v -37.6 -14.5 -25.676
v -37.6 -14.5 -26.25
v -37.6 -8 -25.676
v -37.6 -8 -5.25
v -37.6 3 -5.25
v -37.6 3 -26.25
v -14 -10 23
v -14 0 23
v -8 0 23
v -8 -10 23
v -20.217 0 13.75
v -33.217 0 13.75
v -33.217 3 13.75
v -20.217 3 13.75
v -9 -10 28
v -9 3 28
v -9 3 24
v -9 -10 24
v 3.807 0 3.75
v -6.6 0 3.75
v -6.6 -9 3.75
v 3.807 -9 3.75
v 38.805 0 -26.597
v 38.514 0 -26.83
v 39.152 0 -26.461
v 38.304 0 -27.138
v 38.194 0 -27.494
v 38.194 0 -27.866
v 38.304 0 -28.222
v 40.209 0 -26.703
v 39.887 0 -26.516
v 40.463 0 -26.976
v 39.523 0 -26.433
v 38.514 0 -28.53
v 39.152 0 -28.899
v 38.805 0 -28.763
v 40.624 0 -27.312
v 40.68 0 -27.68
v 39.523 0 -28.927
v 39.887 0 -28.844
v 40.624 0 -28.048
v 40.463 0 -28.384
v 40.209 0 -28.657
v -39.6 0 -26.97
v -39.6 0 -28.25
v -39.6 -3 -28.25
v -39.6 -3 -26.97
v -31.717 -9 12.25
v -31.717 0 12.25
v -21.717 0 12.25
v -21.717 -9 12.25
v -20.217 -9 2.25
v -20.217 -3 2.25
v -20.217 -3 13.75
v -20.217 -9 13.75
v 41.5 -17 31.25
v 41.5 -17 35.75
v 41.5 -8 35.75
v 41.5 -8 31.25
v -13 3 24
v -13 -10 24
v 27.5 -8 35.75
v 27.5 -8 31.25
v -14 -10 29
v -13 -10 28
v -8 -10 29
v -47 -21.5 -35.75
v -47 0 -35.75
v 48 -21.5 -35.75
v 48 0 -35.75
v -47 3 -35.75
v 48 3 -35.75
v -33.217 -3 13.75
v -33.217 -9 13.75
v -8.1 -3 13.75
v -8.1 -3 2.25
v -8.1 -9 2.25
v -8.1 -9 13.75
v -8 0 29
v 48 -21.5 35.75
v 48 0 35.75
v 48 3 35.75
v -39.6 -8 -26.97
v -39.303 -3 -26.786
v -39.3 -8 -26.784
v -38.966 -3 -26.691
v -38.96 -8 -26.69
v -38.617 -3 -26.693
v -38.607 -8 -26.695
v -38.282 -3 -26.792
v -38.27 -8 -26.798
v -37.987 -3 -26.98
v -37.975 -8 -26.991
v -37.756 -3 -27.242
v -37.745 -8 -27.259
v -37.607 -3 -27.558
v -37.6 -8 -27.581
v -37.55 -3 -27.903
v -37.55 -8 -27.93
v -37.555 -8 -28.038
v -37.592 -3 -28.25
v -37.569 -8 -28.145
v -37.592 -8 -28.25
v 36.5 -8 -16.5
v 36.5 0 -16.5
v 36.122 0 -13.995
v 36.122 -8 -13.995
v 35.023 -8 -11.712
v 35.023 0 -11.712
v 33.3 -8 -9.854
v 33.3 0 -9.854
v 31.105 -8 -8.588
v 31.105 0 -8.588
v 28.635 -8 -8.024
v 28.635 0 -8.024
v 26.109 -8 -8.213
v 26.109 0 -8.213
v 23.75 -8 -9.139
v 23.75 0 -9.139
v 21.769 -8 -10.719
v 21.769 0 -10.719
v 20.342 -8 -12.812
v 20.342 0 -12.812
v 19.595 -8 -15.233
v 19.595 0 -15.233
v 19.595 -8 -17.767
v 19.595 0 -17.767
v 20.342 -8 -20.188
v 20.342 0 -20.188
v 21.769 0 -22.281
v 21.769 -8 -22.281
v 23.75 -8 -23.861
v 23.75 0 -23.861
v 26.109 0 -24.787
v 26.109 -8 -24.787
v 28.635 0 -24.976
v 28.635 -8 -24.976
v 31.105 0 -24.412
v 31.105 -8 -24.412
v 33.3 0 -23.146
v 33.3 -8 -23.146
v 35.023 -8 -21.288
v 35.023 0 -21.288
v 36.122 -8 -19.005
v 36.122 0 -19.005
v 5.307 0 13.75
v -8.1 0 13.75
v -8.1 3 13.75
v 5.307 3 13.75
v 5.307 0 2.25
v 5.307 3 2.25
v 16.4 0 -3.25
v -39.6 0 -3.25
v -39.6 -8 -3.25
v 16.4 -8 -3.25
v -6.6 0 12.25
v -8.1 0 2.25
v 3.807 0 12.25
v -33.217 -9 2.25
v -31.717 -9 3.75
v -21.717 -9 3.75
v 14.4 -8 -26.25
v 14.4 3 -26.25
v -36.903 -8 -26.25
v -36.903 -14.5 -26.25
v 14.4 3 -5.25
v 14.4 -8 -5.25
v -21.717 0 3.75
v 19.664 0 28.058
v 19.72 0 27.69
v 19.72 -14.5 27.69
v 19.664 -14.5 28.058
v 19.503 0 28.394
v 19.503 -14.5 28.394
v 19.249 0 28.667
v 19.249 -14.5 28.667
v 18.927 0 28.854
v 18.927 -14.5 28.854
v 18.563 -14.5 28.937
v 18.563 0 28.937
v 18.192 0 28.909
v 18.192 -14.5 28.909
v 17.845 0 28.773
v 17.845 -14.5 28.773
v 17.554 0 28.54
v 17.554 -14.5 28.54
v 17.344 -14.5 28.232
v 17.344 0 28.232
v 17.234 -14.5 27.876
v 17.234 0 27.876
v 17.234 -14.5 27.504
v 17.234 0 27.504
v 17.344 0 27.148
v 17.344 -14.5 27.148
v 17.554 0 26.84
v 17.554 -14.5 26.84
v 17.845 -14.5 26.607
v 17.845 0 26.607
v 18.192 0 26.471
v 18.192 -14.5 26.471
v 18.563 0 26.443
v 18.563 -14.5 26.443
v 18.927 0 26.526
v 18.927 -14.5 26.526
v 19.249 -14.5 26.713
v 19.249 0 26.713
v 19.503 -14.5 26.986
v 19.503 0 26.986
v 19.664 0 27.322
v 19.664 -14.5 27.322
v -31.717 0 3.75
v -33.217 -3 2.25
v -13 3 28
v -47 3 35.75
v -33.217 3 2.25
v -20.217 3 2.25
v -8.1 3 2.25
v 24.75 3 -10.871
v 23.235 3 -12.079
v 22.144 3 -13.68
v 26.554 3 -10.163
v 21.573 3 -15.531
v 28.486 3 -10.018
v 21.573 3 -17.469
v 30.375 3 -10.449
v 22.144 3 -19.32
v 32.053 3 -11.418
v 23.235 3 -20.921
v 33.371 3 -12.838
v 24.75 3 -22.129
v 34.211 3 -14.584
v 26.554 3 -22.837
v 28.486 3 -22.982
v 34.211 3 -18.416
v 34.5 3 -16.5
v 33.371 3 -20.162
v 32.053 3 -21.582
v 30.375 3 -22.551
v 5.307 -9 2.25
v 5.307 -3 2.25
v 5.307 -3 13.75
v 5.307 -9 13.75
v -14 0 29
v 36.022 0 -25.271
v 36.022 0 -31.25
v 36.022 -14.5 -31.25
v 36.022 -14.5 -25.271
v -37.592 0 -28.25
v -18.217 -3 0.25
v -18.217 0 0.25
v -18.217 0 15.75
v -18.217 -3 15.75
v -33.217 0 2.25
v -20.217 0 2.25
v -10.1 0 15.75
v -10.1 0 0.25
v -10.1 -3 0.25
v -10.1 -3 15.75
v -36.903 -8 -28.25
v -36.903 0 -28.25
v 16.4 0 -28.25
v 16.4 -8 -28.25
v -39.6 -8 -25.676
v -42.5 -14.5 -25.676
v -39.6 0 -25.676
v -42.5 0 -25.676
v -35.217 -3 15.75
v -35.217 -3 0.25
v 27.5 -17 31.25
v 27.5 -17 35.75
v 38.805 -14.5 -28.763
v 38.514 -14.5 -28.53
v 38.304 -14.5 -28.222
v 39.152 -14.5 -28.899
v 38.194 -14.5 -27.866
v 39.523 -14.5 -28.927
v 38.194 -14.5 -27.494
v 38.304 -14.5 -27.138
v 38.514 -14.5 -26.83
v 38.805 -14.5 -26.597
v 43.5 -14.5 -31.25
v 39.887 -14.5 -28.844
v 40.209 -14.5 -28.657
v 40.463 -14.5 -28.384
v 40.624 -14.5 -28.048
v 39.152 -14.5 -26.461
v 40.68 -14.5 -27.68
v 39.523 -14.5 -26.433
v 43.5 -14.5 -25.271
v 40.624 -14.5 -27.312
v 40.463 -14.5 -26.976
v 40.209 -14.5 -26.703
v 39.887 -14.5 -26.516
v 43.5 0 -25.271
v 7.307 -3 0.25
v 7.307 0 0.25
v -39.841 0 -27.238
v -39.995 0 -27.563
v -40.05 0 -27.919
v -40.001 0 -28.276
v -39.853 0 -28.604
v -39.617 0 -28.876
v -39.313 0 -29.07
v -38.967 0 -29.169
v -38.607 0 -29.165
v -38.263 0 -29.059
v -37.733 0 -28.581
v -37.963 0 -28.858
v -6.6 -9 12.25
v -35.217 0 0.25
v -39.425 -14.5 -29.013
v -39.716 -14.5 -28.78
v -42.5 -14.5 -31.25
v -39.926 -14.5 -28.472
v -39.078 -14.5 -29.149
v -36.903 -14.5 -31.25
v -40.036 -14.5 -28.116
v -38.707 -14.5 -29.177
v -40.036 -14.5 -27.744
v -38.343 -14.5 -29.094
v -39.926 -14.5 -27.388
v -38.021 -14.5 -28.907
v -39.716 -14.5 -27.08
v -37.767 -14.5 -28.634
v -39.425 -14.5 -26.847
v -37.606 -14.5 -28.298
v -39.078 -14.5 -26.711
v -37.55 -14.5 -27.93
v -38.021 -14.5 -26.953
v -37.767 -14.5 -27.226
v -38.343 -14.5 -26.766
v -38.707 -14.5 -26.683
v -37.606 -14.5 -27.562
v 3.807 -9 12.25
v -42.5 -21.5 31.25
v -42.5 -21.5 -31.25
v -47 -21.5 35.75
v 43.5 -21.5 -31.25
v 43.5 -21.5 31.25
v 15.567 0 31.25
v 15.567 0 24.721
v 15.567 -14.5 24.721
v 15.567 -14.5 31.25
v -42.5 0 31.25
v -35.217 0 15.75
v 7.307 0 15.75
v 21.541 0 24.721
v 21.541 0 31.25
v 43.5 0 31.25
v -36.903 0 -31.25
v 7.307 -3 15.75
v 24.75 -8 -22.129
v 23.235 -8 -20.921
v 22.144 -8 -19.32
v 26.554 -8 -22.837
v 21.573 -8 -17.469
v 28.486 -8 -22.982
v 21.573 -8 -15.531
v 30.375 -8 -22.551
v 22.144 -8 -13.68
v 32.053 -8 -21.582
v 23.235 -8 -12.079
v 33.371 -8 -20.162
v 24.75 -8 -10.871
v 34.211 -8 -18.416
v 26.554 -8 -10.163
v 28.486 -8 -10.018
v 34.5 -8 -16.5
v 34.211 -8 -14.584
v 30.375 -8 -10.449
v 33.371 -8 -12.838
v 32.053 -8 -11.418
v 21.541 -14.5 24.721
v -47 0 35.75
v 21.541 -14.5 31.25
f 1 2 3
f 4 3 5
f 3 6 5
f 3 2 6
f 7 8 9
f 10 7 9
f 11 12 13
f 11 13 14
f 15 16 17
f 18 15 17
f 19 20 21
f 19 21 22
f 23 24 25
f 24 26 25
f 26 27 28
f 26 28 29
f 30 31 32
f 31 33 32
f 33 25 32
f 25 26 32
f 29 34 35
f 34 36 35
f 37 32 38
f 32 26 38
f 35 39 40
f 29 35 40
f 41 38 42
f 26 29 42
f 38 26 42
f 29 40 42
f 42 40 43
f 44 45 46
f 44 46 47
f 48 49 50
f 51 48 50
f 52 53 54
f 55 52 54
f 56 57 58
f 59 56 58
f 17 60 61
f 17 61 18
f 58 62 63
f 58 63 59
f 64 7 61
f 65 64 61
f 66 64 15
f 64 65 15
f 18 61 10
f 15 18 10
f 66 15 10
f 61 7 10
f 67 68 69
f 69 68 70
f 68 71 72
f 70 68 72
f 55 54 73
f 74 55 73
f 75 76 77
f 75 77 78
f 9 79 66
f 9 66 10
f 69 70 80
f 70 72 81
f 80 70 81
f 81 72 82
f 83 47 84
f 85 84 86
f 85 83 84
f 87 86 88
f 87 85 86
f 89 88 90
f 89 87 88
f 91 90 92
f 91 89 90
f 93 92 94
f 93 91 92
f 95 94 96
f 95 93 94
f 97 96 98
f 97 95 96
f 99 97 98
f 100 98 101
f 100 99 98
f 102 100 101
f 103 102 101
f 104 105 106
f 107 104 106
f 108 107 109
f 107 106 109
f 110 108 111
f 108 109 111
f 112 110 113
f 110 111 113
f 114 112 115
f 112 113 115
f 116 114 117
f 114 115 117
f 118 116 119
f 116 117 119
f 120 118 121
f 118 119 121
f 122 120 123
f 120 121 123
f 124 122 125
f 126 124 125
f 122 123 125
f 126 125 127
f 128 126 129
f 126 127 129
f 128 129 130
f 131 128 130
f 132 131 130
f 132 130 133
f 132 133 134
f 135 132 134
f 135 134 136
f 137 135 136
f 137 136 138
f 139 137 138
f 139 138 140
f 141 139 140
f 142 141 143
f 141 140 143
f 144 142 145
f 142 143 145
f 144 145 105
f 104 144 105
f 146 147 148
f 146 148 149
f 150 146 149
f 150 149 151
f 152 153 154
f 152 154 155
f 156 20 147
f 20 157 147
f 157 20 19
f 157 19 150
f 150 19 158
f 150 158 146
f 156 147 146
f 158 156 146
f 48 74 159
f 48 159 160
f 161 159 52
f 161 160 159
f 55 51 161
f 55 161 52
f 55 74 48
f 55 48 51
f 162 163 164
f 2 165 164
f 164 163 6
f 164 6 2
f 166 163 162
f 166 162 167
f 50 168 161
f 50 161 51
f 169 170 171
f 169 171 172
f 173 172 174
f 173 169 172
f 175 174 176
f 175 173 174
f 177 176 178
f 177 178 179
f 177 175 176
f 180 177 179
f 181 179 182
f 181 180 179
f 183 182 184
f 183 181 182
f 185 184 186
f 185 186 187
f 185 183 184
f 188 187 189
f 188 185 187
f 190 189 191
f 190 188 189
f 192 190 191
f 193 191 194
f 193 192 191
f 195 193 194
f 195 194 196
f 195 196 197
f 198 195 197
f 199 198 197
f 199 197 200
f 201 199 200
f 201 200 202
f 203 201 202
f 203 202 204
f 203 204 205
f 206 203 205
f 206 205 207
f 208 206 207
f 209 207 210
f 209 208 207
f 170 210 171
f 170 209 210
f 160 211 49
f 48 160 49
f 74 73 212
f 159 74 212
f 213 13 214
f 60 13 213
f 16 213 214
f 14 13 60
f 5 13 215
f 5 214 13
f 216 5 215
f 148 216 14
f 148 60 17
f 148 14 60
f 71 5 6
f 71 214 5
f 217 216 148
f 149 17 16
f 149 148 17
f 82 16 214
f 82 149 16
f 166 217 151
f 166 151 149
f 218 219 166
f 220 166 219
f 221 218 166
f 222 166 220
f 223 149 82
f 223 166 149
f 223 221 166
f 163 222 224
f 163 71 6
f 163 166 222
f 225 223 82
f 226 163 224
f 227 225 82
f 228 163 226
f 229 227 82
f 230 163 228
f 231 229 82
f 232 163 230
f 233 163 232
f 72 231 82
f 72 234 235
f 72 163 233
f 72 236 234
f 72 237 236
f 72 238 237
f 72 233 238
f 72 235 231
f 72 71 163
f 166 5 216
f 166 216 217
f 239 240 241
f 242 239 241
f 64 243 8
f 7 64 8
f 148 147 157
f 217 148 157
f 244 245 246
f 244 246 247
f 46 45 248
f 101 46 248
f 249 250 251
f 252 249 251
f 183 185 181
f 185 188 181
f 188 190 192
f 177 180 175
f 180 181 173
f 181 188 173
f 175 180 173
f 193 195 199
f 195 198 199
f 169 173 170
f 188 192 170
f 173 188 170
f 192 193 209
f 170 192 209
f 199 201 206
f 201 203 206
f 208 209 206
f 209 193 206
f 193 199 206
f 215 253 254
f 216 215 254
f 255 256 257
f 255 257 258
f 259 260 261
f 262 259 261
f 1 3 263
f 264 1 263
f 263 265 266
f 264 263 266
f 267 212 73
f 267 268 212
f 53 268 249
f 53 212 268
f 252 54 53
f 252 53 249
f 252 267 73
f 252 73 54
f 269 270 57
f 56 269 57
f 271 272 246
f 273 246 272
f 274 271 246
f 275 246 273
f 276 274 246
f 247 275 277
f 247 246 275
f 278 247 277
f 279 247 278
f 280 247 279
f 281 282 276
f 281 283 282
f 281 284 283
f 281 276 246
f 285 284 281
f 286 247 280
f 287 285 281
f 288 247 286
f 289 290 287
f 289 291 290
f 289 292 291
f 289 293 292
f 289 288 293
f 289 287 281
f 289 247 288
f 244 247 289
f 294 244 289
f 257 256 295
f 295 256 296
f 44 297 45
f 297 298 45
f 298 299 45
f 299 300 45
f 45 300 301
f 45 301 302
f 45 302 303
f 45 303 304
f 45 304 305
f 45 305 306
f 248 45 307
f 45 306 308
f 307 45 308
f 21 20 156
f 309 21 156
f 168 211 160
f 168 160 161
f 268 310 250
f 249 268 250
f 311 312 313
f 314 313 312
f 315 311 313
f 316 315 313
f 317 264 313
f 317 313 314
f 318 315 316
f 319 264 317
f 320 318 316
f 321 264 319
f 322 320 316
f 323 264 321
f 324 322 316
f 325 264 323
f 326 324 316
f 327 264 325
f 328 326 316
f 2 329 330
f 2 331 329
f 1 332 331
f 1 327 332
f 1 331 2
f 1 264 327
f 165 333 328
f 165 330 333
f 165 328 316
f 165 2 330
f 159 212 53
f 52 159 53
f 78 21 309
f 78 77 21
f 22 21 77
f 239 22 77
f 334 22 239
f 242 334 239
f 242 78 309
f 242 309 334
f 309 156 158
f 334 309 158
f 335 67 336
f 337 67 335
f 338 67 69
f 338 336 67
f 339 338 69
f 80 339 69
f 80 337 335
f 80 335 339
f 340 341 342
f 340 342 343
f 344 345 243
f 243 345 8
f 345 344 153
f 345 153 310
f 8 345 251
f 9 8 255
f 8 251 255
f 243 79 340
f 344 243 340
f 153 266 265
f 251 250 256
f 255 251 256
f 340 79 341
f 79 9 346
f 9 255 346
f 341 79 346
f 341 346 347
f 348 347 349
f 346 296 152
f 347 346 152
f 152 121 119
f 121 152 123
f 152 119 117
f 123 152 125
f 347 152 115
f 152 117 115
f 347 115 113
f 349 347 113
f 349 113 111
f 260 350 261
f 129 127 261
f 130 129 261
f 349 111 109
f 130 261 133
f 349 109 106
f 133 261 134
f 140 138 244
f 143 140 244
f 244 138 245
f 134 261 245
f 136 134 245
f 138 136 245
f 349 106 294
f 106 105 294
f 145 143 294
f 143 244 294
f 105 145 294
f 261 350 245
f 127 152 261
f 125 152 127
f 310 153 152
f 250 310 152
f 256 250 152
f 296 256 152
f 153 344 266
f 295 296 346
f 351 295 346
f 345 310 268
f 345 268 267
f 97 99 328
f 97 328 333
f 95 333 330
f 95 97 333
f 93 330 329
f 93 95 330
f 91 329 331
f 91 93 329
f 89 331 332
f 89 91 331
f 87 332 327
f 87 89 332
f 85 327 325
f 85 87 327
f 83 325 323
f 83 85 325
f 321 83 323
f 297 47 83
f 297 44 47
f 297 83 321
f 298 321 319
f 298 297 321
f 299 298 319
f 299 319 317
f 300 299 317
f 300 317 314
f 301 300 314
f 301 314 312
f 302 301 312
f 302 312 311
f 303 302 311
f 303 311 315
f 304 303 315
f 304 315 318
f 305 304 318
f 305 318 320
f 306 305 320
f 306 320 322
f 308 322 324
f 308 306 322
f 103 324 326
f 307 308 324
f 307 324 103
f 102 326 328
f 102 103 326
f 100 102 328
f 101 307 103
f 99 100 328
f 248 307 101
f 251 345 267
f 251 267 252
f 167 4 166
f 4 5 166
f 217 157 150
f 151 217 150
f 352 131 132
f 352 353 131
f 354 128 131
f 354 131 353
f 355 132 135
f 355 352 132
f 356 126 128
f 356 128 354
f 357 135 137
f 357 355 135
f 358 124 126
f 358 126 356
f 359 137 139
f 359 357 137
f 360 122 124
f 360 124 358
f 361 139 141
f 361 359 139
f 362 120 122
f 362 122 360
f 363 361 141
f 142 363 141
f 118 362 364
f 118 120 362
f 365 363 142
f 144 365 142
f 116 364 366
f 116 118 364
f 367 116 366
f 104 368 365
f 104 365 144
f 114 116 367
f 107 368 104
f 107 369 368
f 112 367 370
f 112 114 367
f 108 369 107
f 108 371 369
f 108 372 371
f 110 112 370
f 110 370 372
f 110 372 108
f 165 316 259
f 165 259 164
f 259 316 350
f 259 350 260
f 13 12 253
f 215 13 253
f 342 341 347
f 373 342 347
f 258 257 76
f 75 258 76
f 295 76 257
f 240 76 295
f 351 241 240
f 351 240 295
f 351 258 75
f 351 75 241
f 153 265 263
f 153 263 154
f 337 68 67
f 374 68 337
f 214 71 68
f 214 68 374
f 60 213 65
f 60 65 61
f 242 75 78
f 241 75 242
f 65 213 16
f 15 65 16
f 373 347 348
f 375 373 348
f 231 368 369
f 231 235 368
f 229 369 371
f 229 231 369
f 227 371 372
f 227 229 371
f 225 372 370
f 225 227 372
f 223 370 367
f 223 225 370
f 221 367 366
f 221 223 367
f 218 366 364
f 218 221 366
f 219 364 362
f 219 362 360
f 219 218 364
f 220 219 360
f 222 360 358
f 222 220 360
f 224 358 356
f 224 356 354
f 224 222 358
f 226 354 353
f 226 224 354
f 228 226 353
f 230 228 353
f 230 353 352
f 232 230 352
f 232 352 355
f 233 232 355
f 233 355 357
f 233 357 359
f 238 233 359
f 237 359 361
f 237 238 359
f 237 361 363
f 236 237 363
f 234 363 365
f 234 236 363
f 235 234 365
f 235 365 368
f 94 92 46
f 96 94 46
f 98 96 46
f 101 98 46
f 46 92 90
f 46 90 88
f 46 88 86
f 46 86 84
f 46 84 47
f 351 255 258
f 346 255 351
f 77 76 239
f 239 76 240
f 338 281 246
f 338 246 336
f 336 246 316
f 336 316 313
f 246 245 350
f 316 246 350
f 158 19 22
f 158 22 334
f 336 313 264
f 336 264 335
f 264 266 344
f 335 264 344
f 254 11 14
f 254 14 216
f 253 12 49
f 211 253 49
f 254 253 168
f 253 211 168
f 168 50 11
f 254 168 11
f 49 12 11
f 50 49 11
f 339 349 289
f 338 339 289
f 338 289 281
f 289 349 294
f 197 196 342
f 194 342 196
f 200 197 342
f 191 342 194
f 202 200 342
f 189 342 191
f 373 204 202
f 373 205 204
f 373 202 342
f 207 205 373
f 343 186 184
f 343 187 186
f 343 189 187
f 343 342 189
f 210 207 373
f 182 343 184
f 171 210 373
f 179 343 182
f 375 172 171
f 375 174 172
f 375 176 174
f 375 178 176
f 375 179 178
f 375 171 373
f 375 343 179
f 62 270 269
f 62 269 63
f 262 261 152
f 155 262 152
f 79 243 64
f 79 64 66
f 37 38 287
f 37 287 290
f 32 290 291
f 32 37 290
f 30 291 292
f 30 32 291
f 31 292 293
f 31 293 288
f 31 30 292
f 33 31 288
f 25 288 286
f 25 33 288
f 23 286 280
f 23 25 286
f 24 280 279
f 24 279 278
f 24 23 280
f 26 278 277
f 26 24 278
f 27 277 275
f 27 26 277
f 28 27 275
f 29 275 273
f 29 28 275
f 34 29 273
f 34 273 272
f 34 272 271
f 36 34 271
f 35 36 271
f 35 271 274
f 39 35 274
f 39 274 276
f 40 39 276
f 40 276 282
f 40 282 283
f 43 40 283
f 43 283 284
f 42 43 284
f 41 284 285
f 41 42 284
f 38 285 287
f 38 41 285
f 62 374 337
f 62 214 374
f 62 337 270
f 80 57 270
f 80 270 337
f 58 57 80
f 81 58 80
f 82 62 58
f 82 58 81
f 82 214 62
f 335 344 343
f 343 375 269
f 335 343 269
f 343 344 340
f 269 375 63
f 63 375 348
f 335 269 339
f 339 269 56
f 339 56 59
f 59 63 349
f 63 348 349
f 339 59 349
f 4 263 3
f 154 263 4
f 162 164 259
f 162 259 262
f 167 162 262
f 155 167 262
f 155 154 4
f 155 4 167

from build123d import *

# Parameters (mm, degrees)
SKETCH1_W             = 13
SKETCH1_H             = 11.5
SKETCH1_W_2           = 13.406613497
SKETCH1_W_3           = 52
SKETCH1_H_2           = 21
SKETCH1_R             = 6.5
BOSS_EXTRUDE1_DEPTH   = 3
SKETCH2_W             = 95
SKETCH2_H             = 71.500049505
BOSS_EXTRUDE2_DEPTH   = 21.5
SKETCH3_R             = 1.25
SKETCH3_W             = 7.478374846
SKETCH3_H             = 5.979454016
SKETCH3_W_2           = 5.973627986
SKETCH3_H_2           = 6.528755861
BOSS_EXTRUDE3_DEPTH   = 14.5
CUT_EXTRUDE1_REACH    = 73.5
SKETCH4_W             = 14
SKETCH4_H             = 9
SKETCH5_R             = 8.5
SKETCH5_R_2           = 6.5
SKETCH5_W             = 56
SKETCH5_H             = 25
SKETCH5_W_2           = 52
SKETCH5_H_2           = 21
BOSS_EXTRUDE4_DEPTH   = 8
SKETCH7_W             = 6
SKETCH7_H             = 6
SKETCH7_W_2           = 4
SKETCH7_H_2           = 4
BOSS_EXTRUDE5_DEPTH   = 13
SKETCH8_W             = 10
SKETCH8_H             = 8.5
BOSS_EXTRUDE6_DEPTH   = 9
SKETCH8_W_2           = 13.406613497
SKETCH8_H_2           = 11.5
SKETCH8_W_3           = 10.406613497
BOSS_EXTRUDE6_2_DEPTH = 9
SKETCH9_W             = 17.406613497
SKETCH9_H             = 15.5
SKETCH9_W_2           = 13.406613497
SKETCH9_H_2           = 11.5
SKETCH9_W_3           = 17
SKETCH9_W_4           = 13
BOSS_EXTRUDE7_DEPTH   = 3
CUT_EXTRUDE2_DEPTH    = 5


with BuildPart() as part:
    # Sketch1 → Boss-Extrude1 (new body)
    with BuildSketch(Plane(origin=(0, 0, 0), x_dir=(1, 0, 0), z_dir=(0, 1, 0))):
        Polygon((48, 35.75), (46, 35.75), (45, 35.75), (-47, 35.75), (-47, 33.75), (-47, -33.75), (-47, -35.750049505), (45, -35.750049505), (46, -35.750049505), (48, -35.750049505), align=None)
        Polygon((-8, -29), (-11, -29), (-14, -29), (-14, -23), (-8, -23), align=None, mode=Mode.SUBTRACT)
        with Locations((-26.716961343, -8)):
            Rectangle(SKETCH1_W, SKETCH1_H, mode=Mode.SUBTRACT)
        with Locations((-1.396693251, -8)):
            Rectangle(SKETCH1_W_2, SKETCH1_H, mode=Mode.SUBTRACT)
        with Locations((-11.6, 15.75)):
            Rectangle(SKETCH1_W_3, SKETCH1_H_2, mode=Mode.SUBTRACT)
        with Locations((28, 16.5)):
            Circle(SKETCH1_R, mode=Mode.SUBTRACT)
    extrude(amount=BOSS_EXTRUDE1_DEPTH)

    # Sketch2 → Boss-Extrude2 (add)
    with BuildSketch(Plane.XZ):
        with Locations((0.5, 2.4752e-05)):
            Rectangle(SKETCH2_W, SKETCH2_H)
        Polygon((41.5, -31.25), (40.5, -31.25), (-42.5, -31.25), (-42.5, 31.25), (40.5, 31.25), (41.5, 31.25), (43.5, 31.25), (43.5, -31.25), align=None, mode=Mode.SUBTRACT)
    extrude(amount=BOSS_EXTRUDE2_DEPTH)

    # Sketch3 → Boss-Extrude3 (add)
    with BuildSketch(Plane.XZ):
        Polygon((-38.8, -25.675777927), (-42.5, -25.675777927), (-42.5, -31.25), (-36.902935229, -31.25), (-36.902935229, -27.93), (-36.902935229, -26.25), (-37.6, -26.25), (-37.6, -25.675777927), align=None)
        with Locations((-38.8, -27.93)):
            Circle(SKETCH3_R, mode=Mode.SUBTRACT)
        with Locations((39.760812577, -28.260272992)):
            Rectangle(SKETCH3_W, SKETCH3_H)
        with Locations((39.43, -27.68)):
            Circle(SKETCH3_R, mode=Mode.SUBTRACT)
        with Locations((18.554223867, 27.98562207)):
            Rectangle(SKETCH3_W_2, SKETCH3_H_2)
        with Locations((18.47, 27.69)):
            Circle(SKETCH3_R, mode=Mode.SUBTRACT)
    extrude(amount=BOSS_EXTRUDE3_DEPTH)

    # Sketch4 → Cut-Extrude1 (cut, up to next)
    with BuildSketch(Plane.XY.offset(35.750049505), mode=Mode.PRIVATE) as cut_extrude1_sk1:
        with Locations((34.5, -12.5)):
            Rectangle(SKETCH4_W, SKETCH4_H)
    cut_extrude1_tool1 = extrude(cut_extrude1_sk1.sketch, amount=-CUT_EXTRUDE1_REACH, mode=Mode.PRIVATE) & part.part
    add(cut_extrude1_tool1.solids().sort_by_distance((34.5, -12.5, 35.75005))[0], mode=Mode.SUBTRACT)

    # Sketch5 → Boss-Extrude4 (add)
    with BuildSketch(Plane.XZ):
        with Locations((28, -16.5)):
            Circle(SKETCH5_R)
        with Locations((28, -16.5)):
            Circle(SKETCH5_R_2, mode=Mode.SUBTRACT)
        with Locations((-11.6, -15.75)):
            Rectangle(SKETCH5_W, SKETCH5_H)
        with Locations((-11.6, -15.75)):
            Rectangle(SKETCH5_W_2, SKETCH5_H_2, mode=Mode.SUBTRACT)
    extrude(amount=BOSS_EXTRUDE4_DEPTH)

    # Sketch7 → Boss-Extrude5 (add)
    with BuildSketch(Plane(origin=(0, 3, 0), x_dir=(1, 0, 0), z_dir=(0, 1, 0))):
        with Locations((-11, -26)):
            Rectangle(SKETCH7_W, SKETCH7_H)
        with Locations((-11, -26)):
            Rectangle(SKETCH7_W_2, SKETCH7_H_2, mode=Mode.SUBTRACT)
    extrude(amount=-BOSS_EXTRUDE5_DEPTH)



with BuildPart() as body_2:
    # Sketch8 → Boss-Extrude6 (new body)
    with BuildSketch(Plane.XZ):
        Polygon((-33.216961343, 12.25), (-33.216961343, 2.25), (-20.216961343, 2.25), (-20.216961343, 12.25), (-20.216961343, 13.75), (-33.216961343, 13.75), align=None)
        with Locations((-26.716961343, 8)):
            Rectangle(SKETCH8_W, SKETCH8_H, mode=Mode.SUBTRACT)
    extrude(amount=BOSS_EXTRUDE6_DEPTH)


with BuildPart() as body_3:
    # Sketch8 → Boss-Extrude6 2 (new body)
    with BuildSketch(Plane.XZ):
        with Locations((-1.396693251, 8)):
            Rectangle(SKETCH8_W_2, SKETCH8_H_2)
        with Locations((-1.396693252, 8)):
            Rectangle(SKETCH8_W_3, SKETCH8_H, mode=Mode.SUBTRACT)
    extrude(amount=BOSS_EXTRUDE6_2_DEPTH)


with BuildPart() as part_1:
    add(part.part)

    add(body_2.part)  # Boss-Extrude7 merges body 2

    add(body_3.part)  # Boss-Extrude7 merges body 3
    # Sketch9 → Boss-Extrude7 (add)
    with BuildSketch(Plane.XZ):
        with Locations((-1.396693252, 8)):
            Rectangle(SKETCH9_W, SKETCH9_H)
        with Locations((-1.396693251, 8)):
            Rectangle(SKETCH9_W_2, SKETCH9_H_2, mode=Mode.SUBTRACT)
        with Locations((-26.716961343, 8)):
            Rectangle(SKETCH9_W_3, SKETCH9_H)
        with Locations((-26.716961343, 8)):
            Rectangle(SKETCH9_W_4, SKETCH9_H_2, mode=Mode.SUBTRACT)
    extrude(amount=BOSS_EXTRUDE7_DEPTH)

    # Sketch10 → Cut-Extrude2 (cut)
    with BuildSketch(Plane.XZ.offset(8)):
        with BuildLine():
            Line((-39.6, -28.25), (-39.6, -26.969531364))
            ThreePointArc((-39.6, -26.969531364), (-38.127998072, -26.876001229), (-37.591654023, -28.25))
            Line((-37.591654023, -28.25), (-39.6, -28.25))
        make_face()
    extrude(amount=-CUT_EXTRUDE2_DEPTH, mode=Mode.SUBTRACT)


solid = part_1.part
